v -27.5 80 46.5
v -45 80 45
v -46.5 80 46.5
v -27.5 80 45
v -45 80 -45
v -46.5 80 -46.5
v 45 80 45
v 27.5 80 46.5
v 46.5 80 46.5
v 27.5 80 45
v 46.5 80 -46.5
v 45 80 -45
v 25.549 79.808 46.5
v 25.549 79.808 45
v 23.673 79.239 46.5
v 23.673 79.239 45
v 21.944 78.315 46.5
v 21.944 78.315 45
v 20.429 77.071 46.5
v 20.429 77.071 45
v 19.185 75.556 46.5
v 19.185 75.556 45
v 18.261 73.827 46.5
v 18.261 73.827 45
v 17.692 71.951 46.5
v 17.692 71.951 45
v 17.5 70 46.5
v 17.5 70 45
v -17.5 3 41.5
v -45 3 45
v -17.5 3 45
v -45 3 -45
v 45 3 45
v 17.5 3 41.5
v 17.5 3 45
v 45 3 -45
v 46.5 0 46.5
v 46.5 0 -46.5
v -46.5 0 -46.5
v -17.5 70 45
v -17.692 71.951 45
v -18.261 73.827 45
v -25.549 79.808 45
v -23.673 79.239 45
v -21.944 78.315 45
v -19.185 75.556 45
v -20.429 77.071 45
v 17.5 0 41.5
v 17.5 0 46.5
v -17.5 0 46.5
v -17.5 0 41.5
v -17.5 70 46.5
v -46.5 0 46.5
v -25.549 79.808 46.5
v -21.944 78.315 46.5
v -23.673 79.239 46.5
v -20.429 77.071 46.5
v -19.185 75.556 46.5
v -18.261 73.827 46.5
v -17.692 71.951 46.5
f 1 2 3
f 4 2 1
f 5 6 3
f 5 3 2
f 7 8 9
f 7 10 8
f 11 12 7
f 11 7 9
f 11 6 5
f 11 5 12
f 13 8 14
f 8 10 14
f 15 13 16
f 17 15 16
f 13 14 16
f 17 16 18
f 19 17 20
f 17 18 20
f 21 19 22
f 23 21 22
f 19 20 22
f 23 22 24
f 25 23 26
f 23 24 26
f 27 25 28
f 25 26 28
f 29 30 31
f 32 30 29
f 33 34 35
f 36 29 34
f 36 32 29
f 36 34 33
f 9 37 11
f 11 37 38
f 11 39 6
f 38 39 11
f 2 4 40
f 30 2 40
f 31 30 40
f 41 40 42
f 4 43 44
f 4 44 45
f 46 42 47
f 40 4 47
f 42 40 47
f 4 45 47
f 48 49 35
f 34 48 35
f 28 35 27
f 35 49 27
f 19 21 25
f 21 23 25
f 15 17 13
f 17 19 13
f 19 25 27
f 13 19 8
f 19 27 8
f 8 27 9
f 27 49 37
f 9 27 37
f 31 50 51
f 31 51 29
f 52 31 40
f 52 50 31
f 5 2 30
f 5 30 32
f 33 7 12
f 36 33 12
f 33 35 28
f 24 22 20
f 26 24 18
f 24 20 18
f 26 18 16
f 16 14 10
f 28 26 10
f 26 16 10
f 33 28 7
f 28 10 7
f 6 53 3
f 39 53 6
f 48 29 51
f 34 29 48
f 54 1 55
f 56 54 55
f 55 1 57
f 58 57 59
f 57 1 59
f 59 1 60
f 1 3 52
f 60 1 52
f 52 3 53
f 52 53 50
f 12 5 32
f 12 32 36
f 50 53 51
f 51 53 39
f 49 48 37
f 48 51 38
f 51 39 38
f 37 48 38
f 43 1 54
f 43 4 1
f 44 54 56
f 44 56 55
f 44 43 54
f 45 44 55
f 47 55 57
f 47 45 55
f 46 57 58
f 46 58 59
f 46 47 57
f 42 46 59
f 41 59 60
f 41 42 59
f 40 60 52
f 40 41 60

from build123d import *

# Parameters (mm, degrees)
SKETCH1_W           = 93
SKETCH1_H           = 93
BOSS_EXTRUDE1_DEPTH = 80
SKETCH3_W           = 90
SKETCH3_H           = 90
CUT_EXTRUDE1_DEPTH  = 77
SKETCH4_W           = 35
SKETCH4_H           = 80
CUT_EXTRUDE2_DEPTH  = 5
FILLET1_R           = 10


with BuildPart() as part:
    # Sketch1 → Boss-Extrude1 (new body)
    with BuildSketch(Plane(origin=(0, 0, 0), x_dir=(1, 0, 0), z_dir=(0, 1, 0))):
        Rectangle(SKETCH1_W, SKETCH1_H)
    extrude(amount=BOSS_EXTRUDE1_DEPTH)

    # Sketch3 → Cut-Extrude1 (cut)
    with BuildSketch(Plane(origin=(0, 80, 0), x_dir=(1, 0, 0), z_dir=(0, 1, 0))):
        Rectangle(SKETCH3_W, SKETCH3_H)
    extrude(amount=-CUT_EXTRUDE1_DEPTH, mode=Mode.SUBTRACT)

    # Sketch4 → Cut-Extrude2 (cut)
    with BuildSketch(Plane.XY.offset(46.5)):
        with Locations((0, 40)):
            Rectangle(SKETCH4_W, SKETCH4_H)
    extrude(amount=-CUT_EXTRUDE2_DEPTH, mode=Mode.SUBTRACT)

    # Fillet1
    fillet1_edges = [part.edges().sort_by_distance(p)[0] for p in [
        (-17.5, 80, 45.75),
        (17.5, 80, 45.75),
    ]]
    fillet(fillet1_edges, radius=FILLET1_R)


solid = part.part
